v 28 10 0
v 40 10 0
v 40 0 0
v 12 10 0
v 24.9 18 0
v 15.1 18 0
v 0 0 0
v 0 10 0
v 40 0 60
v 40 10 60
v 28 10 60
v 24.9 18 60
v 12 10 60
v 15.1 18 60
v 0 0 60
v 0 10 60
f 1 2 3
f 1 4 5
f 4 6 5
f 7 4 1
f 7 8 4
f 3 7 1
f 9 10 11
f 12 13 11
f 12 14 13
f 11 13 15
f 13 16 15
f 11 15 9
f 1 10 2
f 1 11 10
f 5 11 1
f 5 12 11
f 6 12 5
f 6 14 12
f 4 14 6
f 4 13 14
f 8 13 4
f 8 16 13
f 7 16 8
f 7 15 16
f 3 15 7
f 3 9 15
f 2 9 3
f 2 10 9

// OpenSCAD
$fn = 32;

// ----------------------------------------------------------------------
// V guide rail: dovetail, 40 mm wide
// ----------------------------------------------------------------------

// --- parameters (mm) ---
rail_w = 40;              // rail width, X
base_t = 10;              // base plate thickness
v_depth = 8;              // V feature depth / height
v_half_w = 8;             // half width of the V at the base face
plate_t = 60;             // rail length, Z (the extrusion height)
top_half_w = 4.9;         // half width at the dovetail top

dovetail_base = 2 * v_half_w;  // dovetail width at the base
dovetail_top = 2 * top_half_w;  // dovetail width at the top

profile = [[0, 0], [40, 0], [40, 10], [28, 10], [24.9, 18], [15.1, 18], [12, 10], [0, 10]];  // primary outline, 8 points, counter clockwise

// --- the one profile operation ---
linear_extrude(height = plate_t) polygon(points = profile);
